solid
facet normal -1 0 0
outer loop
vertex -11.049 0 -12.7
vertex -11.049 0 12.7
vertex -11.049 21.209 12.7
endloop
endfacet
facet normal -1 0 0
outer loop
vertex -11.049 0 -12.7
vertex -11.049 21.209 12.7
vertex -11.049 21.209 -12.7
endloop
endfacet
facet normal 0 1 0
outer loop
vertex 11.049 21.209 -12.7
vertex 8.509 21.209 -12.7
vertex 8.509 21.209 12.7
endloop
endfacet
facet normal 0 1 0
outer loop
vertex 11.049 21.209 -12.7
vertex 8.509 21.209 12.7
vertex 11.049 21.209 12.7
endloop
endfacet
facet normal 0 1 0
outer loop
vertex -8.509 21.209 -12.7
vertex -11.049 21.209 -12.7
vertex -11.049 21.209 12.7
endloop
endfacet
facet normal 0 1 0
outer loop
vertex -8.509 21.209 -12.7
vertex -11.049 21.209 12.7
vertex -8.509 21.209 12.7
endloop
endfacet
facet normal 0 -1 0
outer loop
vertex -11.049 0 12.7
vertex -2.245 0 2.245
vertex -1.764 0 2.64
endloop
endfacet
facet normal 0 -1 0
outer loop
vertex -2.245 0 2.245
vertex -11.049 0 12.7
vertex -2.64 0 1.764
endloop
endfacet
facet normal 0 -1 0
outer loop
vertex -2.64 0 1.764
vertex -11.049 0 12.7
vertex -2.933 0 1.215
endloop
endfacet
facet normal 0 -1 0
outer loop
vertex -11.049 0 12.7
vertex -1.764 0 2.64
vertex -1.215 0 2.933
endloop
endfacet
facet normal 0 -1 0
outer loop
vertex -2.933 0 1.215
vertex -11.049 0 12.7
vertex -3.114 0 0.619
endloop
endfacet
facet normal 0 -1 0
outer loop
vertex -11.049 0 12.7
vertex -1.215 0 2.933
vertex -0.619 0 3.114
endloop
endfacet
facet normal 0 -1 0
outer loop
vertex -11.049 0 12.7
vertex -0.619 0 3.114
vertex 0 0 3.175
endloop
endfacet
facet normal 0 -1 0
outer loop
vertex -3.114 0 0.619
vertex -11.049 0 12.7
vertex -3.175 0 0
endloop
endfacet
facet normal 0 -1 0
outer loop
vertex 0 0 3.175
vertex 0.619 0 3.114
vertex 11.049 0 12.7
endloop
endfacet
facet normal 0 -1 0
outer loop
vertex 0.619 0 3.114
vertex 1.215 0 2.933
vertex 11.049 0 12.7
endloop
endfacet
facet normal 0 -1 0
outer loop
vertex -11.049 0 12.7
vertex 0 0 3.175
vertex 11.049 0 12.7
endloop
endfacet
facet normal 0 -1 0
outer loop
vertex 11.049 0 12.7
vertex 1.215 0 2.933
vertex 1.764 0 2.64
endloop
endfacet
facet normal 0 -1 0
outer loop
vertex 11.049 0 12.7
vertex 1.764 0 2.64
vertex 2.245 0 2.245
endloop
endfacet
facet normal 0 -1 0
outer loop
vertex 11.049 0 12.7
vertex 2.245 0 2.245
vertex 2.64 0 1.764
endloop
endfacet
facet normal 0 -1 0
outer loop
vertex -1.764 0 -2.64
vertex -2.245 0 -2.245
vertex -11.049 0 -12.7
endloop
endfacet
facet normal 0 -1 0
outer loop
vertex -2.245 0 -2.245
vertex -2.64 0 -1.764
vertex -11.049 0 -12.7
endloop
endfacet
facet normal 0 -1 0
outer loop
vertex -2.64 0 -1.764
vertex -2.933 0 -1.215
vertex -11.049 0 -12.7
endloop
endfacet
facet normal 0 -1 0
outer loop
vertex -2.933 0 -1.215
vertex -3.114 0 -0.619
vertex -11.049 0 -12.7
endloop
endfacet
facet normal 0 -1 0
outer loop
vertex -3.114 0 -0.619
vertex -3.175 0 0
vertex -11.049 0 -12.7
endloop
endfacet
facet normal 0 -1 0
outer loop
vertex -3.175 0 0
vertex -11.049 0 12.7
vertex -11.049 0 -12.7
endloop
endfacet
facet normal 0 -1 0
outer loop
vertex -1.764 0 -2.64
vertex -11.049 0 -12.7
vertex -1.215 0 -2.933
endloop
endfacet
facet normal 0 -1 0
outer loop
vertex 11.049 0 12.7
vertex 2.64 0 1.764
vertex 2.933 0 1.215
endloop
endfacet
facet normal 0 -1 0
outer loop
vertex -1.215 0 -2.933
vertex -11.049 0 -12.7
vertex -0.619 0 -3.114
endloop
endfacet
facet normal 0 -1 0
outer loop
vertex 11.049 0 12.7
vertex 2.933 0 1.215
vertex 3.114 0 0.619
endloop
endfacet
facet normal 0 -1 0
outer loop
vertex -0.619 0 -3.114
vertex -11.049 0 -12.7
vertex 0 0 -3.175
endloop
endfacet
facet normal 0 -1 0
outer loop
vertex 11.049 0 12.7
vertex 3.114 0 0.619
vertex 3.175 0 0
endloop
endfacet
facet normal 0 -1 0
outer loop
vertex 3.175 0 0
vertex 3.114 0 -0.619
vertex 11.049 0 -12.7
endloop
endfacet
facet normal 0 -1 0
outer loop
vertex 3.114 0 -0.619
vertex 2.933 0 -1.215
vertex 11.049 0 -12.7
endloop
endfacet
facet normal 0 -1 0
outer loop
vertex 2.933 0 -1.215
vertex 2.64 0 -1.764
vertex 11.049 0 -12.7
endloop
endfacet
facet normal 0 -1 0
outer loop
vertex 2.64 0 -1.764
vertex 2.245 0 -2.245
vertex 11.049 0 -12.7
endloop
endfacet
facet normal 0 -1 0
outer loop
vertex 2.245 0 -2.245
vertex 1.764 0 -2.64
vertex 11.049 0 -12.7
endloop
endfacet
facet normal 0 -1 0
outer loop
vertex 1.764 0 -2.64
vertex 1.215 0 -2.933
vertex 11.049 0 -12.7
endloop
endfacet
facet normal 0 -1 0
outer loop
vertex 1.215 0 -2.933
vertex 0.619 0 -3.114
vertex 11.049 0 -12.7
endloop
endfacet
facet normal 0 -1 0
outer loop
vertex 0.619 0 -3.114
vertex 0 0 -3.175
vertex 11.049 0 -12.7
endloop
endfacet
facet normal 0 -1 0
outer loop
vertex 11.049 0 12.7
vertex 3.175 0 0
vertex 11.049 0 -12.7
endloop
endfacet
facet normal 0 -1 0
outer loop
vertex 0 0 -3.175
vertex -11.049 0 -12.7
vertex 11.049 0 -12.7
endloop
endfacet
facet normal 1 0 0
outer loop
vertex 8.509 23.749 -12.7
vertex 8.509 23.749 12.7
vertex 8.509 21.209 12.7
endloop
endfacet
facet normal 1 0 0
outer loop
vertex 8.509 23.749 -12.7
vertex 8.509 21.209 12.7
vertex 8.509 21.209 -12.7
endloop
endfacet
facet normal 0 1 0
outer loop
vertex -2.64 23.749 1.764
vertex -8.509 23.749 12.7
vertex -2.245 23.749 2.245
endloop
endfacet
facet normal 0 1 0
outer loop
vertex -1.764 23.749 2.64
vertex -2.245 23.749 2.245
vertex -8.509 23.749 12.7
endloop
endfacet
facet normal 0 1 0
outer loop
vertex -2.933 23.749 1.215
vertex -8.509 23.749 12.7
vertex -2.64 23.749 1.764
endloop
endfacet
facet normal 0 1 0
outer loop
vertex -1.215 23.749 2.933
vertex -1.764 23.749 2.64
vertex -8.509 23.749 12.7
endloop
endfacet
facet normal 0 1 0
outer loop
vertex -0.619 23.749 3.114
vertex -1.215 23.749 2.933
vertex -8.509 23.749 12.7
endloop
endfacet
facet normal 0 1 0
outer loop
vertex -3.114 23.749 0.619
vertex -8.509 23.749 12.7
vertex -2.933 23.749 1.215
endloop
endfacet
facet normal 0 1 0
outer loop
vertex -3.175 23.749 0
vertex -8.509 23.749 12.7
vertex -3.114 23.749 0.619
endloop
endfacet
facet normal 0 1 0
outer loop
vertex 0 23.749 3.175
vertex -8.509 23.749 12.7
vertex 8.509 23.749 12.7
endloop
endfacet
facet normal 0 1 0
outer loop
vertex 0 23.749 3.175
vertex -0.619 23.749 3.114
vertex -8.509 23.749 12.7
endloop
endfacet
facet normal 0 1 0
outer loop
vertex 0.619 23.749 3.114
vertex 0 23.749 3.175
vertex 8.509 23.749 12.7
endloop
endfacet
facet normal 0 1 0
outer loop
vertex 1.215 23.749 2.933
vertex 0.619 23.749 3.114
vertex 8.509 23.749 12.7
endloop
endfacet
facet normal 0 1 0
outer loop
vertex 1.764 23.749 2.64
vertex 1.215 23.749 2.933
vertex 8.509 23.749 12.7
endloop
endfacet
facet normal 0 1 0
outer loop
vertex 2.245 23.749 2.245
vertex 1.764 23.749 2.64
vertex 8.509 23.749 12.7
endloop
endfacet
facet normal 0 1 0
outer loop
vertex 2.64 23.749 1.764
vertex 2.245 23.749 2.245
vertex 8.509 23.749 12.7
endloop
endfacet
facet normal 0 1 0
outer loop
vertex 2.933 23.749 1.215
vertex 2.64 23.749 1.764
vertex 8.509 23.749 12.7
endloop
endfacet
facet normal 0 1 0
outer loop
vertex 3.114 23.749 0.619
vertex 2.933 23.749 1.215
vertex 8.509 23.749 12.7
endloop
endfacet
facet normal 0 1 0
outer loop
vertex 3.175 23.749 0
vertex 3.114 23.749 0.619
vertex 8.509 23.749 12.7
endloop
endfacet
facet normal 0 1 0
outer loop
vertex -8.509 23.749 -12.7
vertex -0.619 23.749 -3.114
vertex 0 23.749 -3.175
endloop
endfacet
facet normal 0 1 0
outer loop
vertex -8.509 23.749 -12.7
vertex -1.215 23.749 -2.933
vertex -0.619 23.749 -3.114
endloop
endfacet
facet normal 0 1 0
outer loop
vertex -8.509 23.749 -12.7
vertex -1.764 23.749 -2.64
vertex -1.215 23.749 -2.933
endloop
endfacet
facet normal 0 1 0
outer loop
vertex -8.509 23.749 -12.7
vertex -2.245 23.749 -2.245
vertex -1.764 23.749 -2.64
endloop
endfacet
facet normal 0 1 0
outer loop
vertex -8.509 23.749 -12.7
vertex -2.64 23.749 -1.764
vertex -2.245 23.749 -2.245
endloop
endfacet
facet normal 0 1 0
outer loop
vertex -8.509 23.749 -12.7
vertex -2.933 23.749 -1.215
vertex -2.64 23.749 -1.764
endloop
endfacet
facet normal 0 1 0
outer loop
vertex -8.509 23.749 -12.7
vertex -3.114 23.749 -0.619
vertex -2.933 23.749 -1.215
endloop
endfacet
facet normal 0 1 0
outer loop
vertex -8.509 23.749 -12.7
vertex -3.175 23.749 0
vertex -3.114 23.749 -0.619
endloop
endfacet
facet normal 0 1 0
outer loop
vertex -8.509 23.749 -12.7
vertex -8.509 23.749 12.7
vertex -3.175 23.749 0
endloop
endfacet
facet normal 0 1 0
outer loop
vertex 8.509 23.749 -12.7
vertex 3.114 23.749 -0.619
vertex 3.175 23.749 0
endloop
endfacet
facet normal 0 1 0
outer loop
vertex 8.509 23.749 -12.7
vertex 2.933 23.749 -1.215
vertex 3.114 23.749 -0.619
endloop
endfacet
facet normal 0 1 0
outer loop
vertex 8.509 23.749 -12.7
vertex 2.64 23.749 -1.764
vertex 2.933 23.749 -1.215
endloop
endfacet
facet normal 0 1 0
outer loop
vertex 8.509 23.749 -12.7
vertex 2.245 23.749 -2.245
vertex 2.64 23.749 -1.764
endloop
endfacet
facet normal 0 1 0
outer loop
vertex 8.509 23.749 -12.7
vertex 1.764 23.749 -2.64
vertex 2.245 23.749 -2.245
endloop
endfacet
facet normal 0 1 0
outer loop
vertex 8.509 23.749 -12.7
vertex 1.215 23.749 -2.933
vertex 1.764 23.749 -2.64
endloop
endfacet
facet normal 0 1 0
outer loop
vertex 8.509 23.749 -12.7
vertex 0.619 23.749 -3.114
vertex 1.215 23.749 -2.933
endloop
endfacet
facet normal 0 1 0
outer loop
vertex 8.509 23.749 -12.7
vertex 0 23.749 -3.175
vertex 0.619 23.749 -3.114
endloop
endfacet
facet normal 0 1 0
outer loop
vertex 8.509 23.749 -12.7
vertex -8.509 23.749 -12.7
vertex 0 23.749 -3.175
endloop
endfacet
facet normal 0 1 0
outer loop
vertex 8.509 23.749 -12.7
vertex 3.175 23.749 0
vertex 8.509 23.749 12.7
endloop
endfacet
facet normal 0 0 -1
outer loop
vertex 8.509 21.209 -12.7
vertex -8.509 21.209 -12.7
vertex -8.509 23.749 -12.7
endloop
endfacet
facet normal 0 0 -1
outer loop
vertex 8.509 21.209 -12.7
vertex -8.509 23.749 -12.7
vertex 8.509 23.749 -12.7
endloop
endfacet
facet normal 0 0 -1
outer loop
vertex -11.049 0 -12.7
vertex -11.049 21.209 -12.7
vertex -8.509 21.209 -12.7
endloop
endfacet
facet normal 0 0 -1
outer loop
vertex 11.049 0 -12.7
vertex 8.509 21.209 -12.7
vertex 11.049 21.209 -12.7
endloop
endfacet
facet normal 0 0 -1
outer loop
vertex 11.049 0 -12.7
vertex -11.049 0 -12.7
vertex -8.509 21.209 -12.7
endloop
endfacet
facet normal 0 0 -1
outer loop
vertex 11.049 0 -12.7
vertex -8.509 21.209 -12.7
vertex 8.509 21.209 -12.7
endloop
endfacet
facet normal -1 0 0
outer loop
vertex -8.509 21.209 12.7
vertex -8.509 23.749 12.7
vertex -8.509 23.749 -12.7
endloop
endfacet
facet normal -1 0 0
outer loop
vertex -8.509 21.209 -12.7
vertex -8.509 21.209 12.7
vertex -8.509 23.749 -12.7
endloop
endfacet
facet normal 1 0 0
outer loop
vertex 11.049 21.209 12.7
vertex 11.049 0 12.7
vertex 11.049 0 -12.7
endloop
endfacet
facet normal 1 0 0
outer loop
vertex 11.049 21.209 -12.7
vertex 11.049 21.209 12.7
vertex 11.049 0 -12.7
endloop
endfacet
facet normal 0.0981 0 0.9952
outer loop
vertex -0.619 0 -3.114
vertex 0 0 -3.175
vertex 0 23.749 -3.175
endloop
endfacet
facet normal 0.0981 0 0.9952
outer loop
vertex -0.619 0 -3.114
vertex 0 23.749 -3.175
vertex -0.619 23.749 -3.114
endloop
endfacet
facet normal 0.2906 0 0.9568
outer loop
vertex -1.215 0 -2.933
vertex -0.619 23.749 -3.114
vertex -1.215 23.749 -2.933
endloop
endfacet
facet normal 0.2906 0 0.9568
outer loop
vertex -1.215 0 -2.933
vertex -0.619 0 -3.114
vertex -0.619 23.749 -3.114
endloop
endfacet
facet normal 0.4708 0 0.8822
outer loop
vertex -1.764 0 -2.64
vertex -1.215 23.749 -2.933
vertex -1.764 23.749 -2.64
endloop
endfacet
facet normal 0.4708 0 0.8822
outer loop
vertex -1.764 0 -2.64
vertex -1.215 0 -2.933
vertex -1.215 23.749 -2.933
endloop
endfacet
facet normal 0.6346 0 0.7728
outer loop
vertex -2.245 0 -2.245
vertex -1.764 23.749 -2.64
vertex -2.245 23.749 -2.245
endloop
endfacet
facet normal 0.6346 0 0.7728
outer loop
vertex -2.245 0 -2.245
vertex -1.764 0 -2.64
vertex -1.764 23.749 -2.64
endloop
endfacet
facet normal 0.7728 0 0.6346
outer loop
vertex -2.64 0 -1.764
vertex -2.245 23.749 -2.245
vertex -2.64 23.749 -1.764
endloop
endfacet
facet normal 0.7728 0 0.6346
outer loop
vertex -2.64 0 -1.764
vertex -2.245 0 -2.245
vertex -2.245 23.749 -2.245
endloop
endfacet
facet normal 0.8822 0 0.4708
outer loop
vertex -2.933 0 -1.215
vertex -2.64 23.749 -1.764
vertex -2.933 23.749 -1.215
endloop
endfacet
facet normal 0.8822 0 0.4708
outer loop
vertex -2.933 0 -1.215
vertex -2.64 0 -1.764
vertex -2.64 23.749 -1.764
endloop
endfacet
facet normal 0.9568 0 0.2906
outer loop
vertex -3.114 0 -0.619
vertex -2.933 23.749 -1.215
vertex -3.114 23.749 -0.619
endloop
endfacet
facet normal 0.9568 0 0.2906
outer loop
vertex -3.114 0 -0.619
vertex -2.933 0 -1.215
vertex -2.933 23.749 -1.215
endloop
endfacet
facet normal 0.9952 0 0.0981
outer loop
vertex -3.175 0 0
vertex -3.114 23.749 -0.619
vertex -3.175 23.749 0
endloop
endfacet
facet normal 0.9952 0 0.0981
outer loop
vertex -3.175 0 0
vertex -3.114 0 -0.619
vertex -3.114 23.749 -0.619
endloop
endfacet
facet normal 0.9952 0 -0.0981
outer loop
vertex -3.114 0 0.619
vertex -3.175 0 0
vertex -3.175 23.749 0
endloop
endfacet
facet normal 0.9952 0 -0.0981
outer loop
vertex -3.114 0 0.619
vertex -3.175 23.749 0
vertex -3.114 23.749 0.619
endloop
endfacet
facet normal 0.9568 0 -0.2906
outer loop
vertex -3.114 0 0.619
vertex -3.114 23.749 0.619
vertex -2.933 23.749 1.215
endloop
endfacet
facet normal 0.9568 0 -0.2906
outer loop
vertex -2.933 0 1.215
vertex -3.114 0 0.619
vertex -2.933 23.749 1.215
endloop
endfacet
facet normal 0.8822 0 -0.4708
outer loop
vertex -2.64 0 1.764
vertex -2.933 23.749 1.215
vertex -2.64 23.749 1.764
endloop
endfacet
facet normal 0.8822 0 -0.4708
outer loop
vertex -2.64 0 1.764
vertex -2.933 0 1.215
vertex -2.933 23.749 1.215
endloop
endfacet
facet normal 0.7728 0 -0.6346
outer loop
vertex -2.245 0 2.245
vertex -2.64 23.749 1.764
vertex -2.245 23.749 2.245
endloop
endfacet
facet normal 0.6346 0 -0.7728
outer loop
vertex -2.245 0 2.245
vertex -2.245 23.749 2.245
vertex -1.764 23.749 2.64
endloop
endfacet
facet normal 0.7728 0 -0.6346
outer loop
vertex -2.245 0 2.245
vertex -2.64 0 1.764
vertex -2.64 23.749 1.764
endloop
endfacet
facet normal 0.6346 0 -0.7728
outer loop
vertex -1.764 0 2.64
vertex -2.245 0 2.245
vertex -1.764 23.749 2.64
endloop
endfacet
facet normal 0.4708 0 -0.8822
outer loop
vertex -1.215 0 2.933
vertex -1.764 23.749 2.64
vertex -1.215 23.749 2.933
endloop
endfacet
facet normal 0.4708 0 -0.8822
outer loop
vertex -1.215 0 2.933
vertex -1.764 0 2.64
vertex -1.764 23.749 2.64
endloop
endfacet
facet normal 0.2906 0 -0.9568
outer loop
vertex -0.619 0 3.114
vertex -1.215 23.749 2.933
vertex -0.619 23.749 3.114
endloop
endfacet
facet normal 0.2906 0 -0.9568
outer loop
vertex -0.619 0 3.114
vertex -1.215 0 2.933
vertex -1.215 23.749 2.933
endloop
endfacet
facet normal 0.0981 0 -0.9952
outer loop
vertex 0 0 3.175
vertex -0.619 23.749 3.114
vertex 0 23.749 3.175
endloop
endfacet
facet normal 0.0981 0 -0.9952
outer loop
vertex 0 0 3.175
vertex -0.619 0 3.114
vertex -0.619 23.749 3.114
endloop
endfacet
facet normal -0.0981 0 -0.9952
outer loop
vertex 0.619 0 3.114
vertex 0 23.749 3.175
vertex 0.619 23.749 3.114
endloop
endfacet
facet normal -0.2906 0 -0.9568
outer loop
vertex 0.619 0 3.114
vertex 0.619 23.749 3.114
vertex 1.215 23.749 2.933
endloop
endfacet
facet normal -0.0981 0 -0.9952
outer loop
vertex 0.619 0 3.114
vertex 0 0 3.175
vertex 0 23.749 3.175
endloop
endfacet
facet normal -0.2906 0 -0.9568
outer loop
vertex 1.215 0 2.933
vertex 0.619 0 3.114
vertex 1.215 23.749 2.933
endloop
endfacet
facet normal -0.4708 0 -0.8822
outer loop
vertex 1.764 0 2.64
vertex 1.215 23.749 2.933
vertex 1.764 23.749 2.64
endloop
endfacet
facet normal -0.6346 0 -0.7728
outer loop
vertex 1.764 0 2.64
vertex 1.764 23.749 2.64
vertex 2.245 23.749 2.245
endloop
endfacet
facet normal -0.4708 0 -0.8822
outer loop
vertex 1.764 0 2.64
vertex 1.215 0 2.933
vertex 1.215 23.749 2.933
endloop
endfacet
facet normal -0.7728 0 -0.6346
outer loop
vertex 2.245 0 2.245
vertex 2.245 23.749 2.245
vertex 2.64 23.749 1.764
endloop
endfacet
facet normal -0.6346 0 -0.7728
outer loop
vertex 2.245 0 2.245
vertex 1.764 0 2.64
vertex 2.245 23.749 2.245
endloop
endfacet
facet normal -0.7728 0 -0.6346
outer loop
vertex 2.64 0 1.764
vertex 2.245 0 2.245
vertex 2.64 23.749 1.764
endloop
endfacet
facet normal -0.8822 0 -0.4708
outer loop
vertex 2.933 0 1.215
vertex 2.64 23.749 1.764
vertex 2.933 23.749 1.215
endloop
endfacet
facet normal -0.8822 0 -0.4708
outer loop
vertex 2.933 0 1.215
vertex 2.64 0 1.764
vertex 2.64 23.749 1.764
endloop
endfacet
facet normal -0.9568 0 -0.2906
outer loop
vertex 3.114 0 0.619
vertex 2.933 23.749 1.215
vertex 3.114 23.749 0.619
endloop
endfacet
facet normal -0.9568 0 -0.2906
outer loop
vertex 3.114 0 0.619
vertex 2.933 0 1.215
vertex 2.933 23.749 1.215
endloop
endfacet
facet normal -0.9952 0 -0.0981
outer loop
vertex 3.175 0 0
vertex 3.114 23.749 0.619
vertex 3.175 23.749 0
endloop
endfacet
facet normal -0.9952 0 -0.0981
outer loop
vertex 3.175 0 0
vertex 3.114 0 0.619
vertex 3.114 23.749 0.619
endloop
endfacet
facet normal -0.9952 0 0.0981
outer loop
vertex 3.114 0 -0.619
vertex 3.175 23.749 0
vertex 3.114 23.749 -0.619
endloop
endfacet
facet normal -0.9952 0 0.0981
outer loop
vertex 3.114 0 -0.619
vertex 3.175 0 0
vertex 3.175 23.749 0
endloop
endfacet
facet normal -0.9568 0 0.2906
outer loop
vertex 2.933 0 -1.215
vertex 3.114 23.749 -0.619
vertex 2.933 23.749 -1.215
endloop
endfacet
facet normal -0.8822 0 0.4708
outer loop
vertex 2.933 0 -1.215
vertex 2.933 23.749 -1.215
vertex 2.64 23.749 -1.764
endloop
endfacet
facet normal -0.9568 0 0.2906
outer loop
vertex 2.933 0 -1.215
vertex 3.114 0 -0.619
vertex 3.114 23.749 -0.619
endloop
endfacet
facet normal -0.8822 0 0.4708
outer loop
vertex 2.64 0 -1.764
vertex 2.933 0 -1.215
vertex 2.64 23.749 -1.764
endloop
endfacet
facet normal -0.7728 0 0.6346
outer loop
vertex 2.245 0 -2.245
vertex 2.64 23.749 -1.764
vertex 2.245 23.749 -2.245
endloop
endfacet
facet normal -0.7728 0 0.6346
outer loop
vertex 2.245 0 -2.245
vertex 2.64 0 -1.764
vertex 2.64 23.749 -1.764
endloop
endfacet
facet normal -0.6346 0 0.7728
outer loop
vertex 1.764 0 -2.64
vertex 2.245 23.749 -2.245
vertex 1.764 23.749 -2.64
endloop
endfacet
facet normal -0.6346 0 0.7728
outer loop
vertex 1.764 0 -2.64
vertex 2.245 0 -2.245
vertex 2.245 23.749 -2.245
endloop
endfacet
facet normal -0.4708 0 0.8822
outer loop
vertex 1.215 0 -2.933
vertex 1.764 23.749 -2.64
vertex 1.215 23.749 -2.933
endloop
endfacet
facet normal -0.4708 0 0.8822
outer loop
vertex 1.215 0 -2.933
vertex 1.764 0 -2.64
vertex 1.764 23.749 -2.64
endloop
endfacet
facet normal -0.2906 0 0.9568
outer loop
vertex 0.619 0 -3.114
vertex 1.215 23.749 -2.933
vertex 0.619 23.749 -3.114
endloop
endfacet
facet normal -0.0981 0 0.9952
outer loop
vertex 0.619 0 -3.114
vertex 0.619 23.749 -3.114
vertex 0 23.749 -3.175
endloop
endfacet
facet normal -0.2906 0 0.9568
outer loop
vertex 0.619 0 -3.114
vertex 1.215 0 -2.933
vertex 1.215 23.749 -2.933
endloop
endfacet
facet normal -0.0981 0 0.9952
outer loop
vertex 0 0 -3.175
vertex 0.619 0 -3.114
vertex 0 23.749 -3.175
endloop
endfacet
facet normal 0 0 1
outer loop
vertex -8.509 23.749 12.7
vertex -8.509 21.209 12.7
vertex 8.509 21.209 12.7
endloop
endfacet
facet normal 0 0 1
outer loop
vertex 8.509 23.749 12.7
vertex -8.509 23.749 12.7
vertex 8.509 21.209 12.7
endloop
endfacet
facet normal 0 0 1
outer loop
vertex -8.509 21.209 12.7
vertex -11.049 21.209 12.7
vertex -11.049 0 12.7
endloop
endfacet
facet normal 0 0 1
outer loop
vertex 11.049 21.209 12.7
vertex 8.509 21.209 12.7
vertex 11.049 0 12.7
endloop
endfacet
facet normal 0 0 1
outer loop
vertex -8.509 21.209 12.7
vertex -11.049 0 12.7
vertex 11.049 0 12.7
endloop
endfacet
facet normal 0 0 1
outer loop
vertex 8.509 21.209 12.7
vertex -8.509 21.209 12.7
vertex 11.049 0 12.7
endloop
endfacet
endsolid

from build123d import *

# Parameters (mm, degrees)
SKETCH1_W           = 22.098
SKETCH1_H           = 25.4
SKETCH1_R           = 3.175
BOSS_EXTRUDE1_DEPTH = 23.749
SKETCH3_W           = 2.54
SKETCH3_H           = 25.4
CUT_EXTRUDE2_DEPTH  = 2.54


with BuildPart() as part:
    # Sketch1 → Boss-Extrude1 (new body)
    with BuildSketch(Plane(origin=(0, 0, 0), x_dir=(1, 0, 0), z_dir=(0, 1, 0))):
        Rectangle(SKETCH1_W, SKETCH1_H)
        with Locations(Location((0, 0, 0), (0, 0, 90))):
            Circle(SKETCH1_R, mode=Mode.SUBTRACT)
    extrude(amount=BOSS_EXTRUDE1_DEPTH)

    # Sketch3 → Cut-Extrude2 (cut)
    with BuildSketch(Plane(origin=(0, 23.749, 0), x_dir=(1, 0, 0), z_dir=(0, 1, 0))):
        with Locations((9.779, 0)):
            Rectangle(SKETCH3_W, SKETCH3_H)
        with Locations((-9.779, 0)):
            Rectangle(SKETCH3_W, SKETCH3_H)
    extrude(amount=-CUT_EXTRUDE2_DEPTH, mode=Mode.SUBTRACT)


solid = part.part
